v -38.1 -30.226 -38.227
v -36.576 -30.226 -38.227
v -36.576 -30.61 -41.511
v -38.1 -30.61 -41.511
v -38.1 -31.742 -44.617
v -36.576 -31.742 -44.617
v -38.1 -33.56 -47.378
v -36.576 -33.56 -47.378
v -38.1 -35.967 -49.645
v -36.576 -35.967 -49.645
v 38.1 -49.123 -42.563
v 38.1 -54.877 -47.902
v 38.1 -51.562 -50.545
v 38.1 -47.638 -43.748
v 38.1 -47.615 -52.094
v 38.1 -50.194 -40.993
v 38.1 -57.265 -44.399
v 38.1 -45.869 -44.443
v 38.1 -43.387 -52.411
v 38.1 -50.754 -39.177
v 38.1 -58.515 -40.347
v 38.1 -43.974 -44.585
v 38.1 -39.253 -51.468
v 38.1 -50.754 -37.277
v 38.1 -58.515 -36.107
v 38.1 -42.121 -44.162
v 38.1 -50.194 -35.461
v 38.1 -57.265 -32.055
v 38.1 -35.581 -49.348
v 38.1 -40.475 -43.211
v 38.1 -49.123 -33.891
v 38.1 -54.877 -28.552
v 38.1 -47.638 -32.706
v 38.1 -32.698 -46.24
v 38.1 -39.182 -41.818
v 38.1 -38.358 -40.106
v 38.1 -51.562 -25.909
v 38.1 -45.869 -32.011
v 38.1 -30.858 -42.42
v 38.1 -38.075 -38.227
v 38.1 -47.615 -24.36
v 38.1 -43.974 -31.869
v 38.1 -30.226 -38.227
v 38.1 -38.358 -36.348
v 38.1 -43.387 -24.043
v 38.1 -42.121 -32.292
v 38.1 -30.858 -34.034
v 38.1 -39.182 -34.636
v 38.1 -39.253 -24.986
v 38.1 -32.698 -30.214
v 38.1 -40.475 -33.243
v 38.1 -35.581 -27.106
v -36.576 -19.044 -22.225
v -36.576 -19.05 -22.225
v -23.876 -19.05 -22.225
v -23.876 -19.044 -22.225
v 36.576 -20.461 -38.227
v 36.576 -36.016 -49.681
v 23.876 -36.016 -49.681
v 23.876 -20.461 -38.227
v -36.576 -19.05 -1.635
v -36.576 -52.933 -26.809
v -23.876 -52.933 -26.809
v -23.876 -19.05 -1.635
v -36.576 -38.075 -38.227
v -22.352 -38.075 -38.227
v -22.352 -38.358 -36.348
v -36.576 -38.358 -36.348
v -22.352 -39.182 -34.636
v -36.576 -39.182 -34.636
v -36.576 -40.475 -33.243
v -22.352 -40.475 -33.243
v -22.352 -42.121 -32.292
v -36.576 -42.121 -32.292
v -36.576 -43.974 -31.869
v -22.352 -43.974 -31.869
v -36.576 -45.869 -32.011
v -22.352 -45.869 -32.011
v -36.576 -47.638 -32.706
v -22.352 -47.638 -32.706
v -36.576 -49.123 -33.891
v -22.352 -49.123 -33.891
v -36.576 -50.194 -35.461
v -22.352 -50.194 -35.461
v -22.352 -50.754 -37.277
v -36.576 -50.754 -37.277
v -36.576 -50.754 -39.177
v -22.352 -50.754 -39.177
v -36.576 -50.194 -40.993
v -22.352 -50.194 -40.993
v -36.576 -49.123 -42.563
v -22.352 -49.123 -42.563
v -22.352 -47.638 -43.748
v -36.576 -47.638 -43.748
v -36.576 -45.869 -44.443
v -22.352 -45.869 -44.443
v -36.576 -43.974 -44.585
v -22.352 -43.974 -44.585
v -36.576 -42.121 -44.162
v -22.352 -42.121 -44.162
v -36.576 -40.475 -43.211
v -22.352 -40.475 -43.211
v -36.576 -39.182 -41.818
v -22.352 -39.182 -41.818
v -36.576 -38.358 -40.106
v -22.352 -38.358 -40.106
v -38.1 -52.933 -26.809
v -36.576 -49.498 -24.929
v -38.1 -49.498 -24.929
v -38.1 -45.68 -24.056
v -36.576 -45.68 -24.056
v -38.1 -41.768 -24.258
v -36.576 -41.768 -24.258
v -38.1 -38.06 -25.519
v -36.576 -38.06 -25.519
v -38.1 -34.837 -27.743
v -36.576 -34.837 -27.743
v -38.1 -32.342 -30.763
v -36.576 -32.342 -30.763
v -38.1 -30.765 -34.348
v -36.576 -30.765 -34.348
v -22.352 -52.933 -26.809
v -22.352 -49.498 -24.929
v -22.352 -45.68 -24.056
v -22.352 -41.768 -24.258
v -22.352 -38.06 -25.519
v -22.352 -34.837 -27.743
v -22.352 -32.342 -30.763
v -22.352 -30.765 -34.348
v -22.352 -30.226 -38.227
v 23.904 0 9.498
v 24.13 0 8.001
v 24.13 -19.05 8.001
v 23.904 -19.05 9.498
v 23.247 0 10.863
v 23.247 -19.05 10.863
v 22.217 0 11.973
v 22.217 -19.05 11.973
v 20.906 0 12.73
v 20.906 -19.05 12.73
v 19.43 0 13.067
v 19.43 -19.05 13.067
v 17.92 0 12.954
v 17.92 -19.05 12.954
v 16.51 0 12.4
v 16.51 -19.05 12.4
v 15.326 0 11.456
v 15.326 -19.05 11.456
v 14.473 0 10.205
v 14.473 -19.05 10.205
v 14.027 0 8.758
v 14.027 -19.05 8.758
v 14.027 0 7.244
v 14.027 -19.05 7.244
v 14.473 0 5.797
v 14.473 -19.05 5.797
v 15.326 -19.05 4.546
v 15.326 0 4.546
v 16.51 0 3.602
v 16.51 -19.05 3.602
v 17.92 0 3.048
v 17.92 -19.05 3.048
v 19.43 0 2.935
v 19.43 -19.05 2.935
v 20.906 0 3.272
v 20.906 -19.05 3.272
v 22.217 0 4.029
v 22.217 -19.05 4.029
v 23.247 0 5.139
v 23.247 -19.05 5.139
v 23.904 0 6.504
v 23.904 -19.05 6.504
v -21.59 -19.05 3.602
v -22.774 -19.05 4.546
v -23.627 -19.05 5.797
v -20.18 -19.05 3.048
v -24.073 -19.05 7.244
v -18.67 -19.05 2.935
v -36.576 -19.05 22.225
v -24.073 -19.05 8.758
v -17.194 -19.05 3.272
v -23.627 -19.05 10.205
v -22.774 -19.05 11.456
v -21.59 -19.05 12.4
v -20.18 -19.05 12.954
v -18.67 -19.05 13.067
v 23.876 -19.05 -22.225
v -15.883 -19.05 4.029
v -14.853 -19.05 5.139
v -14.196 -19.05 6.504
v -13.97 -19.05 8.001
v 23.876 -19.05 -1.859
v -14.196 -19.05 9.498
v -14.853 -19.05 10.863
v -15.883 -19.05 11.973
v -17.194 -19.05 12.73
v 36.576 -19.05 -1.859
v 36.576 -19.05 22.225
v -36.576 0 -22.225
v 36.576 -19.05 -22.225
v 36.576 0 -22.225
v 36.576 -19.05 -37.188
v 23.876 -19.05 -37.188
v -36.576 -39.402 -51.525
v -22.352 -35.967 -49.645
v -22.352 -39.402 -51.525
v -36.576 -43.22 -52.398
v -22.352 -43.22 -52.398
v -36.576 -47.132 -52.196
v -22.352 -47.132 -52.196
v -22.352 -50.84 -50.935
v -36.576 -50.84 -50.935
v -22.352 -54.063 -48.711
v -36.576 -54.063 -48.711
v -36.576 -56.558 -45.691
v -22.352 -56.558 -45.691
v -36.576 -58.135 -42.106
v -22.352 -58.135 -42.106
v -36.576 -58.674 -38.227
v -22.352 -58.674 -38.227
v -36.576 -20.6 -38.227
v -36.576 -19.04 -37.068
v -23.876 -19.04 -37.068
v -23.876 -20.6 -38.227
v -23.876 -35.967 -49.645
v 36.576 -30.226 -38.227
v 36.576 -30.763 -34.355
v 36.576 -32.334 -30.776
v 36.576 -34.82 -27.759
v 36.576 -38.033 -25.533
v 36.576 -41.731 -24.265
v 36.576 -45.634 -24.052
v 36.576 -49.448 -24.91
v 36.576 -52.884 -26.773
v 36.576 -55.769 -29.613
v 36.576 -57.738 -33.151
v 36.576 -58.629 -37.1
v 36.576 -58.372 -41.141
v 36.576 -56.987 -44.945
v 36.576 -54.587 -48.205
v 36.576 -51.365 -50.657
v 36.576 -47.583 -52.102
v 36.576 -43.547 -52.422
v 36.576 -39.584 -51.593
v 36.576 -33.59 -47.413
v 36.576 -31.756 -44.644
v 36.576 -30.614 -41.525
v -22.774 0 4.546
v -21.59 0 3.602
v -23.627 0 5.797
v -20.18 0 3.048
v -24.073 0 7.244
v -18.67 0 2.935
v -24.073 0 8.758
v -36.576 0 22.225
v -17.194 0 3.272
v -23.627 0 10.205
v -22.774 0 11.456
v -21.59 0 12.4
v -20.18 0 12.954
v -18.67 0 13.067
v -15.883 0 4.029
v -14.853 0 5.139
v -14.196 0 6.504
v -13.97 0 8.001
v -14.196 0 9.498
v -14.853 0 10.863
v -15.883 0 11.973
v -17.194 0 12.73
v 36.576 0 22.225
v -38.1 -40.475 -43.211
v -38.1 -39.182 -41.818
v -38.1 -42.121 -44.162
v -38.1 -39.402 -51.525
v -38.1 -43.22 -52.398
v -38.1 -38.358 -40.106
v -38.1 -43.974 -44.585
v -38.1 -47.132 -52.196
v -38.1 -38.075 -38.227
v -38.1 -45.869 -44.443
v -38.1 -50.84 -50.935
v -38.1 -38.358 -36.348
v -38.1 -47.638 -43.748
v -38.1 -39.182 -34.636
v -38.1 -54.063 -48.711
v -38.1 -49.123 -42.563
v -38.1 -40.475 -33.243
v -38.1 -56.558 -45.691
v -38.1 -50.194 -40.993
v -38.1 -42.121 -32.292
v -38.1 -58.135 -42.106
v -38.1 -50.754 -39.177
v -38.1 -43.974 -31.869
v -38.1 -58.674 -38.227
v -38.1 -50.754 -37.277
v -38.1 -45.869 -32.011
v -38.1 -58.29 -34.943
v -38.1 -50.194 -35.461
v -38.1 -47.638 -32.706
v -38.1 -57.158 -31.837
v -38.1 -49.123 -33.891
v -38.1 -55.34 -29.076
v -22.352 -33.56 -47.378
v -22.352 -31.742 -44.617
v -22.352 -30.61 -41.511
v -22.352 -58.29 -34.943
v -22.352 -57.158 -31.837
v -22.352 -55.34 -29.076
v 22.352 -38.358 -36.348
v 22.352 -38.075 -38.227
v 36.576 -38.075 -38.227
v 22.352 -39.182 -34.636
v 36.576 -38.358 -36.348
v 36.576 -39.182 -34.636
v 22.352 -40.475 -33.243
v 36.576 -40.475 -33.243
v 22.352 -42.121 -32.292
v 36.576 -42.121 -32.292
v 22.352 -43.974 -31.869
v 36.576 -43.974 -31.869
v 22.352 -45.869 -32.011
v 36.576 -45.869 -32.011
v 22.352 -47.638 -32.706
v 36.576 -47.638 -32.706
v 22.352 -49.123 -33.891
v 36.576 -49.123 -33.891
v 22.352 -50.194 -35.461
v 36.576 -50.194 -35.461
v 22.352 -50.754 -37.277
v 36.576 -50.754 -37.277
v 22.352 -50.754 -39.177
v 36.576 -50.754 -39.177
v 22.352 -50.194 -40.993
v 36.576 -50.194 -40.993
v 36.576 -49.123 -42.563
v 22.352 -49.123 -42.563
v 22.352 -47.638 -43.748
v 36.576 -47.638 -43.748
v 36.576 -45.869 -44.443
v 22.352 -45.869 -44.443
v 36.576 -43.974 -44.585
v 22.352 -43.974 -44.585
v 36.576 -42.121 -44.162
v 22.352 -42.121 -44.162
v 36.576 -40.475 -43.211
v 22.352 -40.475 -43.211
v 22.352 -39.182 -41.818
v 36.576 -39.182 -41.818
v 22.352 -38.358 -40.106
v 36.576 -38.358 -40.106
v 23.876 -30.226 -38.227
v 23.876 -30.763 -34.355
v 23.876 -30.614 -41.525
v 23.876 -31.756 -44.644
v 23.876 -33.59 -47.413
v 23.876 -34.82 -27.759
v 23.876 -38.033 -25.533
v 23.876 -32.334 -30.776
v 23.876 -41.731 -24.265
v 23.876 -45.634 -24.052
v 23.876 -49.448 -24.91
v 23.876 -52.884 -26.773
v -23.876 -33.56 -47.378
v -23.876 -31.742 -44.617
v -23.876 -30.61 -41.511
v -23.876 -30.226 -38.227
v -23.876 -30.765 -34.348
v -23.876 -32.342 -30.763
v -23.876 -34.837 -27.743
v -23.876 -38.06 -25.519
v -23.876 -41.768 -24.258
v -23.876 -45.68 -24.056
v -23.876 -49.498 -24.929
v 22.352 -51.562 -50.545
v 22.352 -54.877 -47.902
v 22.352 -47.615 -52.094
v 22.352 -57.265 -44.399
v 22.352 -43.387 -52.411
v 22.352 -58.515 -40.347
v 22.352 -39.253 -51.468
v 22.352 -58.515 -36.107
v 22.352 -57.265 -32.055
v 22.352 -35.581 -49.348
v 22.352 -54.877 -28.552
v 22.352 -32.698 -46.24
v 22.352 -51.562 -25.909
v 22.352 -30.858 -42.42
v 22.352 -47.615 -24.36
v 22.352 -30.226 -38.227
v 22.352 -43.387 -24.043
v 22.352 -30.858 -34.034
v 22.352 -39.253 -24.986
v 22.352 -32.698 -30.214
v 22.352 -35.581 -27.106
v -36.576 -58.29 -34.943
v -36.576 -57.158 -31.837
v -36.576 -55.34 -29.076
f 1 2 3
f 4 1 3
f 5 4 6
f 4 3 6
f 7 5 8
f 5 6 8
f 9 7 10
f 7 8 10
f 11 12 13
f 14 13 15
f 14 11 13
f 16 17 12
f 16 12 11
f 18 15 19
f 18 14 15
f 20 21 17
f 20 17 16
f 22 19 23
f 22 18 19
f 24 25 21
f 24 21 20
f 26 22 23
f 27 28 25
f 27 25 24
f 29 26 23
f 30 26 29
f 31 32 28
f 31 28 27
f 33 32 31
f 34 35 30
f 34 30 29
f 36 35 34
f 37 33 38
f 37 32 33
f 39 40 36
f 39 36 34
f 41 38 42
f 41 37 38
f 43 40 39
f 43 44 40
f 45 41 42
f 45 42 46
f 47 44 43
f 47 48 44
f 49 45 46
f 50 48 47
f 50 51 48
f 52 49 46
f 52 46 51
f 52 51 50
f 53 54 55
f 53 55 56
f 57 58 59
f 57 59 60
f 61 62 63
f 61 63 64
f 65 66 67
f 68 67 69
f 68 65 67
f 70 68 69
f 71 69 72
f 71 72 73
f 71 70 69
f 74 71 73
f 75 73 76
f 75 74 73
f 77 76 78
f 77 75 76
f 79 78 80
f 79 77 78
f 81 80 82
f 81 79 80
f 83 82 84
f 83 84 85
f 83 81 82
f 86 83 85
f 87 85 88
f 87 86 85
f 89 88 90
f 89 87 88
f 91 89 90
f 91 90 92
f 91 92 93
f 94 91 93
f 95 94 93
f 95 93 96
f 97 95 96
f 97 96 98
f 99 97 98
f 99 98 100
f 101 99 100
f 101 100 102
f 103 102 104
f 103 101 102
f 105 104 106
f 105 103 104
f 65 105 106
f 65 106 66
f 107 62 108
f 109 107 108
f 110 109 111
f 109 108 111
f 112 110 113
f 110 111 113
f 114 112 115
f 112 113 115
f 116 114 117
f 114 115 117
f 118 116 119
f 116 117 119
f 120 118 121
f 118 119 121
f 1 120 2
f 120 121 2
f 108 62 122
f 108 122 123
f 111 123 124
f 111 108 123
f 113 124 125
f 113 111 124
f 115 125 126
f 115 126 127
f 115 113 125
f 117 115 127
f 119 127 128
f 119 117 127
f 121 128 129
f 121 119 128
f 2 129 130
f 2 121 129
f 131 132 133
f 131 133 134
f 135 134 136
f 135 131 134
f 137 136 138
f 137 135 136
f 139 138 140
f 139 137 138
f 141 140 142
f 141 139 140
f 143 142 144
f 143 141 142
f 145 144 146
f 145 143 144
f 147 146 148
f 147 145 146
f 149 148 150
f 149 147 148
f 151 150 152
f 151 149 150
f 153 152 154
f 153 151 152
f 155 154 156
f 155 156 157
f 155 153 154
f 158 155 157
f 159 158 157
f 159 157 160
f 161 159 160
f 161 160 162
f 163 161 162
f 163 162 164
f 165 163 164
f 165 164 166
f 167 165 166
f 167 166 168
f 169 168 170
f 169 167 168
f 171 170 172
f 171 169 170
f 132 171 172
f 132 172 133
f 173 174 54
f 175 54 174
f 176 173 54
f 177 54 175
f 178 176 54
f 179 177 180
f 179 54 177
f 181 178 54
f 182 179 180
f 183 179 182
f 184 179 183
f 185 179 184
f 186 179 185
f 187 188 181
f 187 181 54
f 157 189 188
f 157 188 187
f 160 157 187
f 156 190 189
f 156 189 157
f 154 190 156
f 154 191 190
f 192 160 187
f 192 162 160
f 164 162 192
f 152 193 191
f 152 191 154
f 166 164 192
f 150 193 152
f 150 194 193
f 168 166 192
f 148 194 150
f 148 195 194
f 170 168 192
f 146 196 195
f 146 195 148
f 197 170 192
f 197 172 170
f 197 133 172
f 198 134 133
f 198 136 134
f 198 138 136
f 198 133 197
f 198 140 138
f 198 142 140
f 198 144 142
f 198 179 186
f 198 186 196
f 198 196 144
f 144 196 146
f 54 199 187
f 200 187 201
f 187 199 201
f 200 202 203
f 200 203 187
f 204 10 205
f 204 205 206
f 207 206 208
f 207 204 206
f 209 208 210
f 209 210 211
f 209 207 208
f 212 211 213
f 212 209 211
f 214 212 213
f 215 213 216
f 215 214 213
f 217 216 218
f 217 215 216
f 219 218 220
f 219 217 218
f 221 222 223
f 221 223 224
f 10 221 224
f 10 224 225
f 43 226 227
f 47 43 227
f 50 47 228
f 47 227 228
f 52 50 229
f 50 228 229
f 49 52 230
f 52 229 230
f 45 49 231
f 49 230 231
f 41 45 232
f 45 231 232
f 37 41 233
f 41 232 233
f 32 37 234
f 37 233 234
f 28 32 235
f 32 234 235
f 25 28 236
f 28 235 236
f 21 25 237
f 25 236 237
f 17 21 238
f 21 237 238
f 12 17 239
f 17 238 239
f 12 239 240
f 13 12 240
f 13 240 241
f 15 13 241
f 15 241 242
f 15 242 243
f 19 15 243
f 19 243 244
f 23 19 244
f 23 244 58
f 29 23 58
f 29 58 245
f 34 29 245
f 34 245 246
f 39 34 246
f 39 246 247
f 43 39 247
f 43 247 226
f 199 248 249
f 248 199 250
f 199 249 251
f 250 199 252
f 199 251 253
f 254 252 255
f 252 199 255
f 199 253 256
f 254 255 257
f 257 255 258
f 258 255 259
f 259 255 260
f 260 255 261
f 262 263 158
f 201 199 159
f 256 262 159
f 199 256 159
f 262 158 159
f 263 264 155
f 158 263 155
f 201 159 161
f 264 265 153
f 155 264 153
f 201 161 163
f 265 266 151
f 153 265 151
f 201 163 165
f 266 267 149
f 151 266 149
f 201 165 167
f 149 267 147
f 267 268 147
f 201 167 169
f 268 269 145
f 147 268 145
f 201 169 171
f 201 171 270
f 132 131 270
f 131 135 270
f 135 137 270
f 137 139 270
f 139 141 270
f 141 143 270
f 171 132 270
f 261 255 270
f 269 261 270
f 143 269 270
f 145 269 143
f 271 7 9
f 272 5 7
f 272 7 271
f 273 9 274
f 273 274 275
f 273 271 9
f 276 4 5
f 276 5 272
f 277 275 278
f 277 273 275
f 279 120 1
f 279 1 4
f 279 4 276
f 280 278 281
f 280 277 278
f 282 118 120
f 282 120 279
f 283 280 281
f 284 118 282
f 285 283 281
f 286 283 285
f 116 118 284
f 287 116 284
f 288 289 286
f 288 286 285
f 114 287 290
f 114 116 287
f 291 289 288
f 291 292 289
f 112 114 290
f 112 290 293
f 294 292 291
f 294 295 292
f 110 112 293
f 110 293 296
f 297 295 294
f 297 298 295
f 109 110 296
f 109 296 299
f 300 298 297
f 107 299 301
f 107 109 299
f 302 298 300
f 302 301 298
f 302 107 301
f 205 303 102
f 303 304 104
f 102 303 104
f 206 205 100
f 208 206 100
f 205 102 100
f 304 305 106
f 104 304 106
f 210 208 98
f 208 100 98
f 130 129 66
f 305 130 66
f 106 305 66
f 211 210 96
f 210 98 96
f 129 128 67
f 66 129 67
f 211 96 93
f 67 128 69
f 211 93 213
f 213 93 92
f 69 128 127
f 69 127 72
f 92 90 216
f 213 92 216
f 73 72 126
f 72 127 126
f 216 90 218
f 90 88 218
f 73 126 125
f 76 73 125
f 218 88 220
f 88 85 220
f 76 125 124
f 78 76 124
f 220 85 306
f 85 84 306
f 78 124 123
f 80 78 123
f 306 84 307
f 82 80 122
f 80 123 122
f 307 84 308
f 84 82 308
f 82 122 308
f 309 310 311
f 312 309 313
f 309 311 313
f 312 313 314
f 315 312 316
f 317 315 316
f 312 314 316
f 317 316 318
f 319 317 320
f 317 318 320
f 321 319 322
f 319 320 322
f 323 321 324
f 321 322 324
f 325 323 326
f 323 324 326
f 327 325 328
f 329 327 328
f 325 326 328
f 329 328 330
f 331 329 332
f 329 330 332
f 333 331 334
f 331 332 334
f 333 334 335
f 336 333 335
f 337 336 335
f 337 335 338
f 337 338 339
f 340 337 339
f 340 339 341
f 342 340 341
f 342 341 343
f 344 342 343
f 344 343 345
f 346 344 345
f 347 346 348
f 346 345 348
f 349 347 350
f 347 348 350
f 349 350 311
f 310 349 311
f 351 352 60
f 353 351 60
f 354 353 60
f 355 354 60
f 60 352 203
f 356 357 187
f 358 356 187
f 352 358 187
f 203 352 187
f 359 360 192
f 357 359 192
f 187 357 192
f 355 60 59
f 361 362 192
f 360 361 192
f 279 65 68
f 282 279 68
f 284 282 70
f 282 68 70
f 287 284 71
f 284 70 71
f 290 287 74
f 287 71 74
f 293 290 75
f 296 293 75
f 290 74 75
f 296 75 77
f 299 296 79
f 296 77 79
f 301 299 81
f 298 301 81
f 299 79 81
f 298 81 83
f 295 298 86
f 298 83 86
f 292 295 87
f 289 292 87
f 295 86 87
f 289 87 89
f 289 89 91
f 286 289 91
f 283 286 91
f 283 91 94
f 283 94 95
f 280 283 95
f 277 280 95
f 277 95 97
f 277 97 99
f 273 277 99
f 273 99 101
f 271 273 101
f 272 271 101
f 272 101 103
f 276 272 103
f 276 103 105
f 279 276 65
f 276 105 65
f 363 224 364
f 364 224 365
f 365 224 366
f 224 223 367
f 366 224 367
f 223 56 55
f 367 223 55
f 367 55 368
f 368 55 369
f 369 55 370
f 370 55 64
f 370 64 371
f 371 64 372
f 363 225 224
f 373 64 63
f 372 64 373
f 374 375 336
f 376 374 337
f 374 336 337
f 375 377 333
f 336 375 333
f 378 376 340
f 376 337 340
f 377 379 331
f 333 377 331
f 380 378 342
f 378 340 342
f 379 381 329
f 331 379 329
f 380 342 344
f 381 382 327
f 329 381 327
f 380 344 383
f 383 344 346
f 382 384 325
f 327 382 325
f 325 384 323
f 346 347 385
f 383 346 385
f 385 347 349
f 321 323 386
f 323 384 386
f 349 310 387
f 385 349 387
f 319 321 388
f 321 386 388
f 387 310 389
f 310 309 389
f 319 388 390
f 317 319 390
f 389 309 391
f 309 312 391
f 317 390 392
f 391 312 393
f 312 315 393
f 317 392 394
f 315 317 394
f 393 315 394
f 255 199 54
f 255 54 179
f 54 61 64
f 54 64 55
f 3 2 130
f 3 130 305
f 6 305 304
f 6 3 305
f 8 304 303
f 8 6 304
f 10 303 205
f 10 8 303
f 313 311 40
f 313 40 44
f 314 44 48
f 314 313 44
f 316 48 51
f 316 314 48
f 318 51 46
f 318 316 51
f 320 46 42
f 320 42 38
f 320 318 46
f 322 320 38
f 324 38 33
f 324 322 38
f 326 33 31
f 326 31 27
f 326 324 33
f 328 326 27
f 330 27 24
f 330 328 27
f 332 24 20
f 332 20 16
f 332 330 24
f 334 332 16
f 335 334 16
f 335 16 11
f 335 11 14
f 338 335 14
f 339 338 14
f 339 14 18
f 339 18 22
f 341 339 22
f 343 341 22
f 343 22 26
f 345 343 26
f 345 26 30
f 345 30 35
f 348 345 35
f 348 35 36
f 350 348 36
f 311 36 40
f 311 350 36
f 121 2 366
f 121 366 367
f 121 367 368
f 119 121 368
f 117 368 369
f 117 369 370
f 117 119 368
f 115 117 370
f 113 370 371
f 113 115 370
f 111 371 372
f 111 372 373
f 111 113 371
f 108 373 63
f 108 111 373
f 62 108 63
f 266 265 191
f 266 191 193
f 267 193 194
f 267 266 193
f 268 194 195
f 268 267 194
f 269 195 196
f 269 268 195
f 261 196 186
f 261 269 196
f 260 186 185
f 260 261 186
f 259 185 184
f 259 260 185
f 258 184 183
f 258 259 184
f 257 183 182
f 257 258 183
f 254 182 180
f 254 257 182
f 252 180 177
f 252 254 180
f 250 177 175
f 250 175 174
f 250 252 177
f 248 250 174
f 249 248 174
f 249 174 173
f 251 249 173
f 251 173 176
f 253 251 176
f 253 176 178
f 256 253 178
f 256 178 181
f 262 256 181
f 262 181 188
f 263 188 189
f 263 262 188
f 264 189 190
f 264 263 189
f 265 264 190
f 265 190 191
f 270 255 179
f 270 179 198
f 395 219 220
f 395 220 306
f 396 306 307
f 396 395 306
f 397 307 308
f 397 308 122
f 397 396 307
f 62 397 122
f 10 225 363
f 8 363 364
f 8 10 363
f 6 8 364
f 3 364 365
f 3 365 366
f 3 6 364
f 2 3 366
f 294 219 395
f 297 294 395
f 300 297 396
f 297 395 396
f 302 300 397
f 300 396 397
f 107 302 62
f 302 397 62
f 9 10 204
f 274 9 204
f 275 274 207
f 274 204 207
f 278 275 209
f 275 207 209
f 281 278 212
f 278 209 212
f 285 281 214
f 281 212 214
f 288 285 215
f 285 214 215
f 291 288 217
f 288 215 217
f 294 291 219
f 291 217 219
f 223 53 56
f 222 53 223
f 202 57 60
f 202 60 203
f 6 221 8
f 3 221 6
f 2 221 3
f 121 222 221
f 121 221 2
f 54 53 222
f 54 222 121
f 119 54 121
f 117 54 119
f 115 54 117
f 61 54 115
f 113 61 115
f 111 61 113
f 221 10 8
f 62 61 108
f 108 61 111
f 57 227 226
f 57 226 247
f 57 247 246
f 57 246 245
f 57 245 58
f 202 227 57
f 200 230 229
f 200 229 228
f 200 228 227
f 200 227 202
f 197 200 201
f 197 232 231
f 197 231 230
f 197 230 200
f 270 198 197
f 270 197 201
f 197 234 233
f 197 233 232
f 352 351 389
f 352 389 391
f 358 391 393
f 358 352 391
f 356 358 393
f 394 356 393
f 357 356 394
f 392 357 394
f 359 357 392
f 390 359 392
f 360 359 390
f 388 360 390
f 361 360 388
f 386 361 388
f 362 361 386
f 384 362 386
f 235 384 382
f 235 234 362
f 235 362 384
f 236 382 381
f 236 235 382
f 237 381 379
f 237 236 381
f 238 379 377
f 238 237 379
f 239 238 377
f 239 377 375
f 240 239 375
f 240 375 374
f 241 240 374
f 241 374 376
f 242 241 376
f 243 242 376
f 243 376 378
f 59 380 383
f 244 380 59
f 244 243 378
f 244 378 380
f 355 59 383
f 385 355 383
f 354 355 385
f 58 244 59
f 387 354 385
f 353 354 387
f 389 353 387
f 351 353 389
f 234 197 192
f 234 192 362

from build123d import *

# Parameters (mm, degrees)
F0_W          = 73.152
F0_H          = 44.45
F0_R          = 5.08
F1_DEPTH      = 19.05
F3_DEPTH      = 12.7
F2_R          = 6.3754
F4_DEPTH      = 1.524
F4_DEPTH_BACK = 14.224
F6_DEPTH      = 12.7
F7_DEPTH      = 1.524
F7_DEPTH_BACK = 14.224


with BuildPart() as f1:
    # F0 (on Front) → F1 (new body)
    with BuildSketch(Plane.XZ):
        Rectangle(F0_W, F0_H)
        with Locations((-19.05, 8.001)):
            Circle(F0_R, mode=Mode.SUBTRACT)
        with Locations((19.05, 8.001)):
            Circle(F0_R, mode=Mode.SUBTRACT)
    extrude(amount=F1_DEPTH)

    # F2 (on face) → F3 (join)
    with BuildSketch(Plane.YZ.offset(36.576)):
        with BuildLine():
            Line((-36.0159397474, -49.6807680986), (-20.4612958716, -38.227))
            Line((-20.4612958716, -38.227), (-30.226, -38.227))
            ThreePointArc((-30.226, -38.227), (-31.7557444284, -44.6440126604), (-36.0159397474, -49.6807680986))
        make_face()
        with BuildLine():
            Line((-19.05, -22.225), (-19.05, -1.8592908906))
            Line((-19.05, -1.8592908906), (-52.8840602526, -26.7732319014))
            ThreePointArc((-52.8840602526, -26.7732319014), (-38.0329873396, -25.5327444284), (-30.226, -38.227))
            Line((-30.226, -38.227), (-20.4612958716, -38.227))
            Line((-20.4612958716, -38.227), (-19.05, -37.187841339))
            Line((-19.05, -37.187841339), (-19.05, -22.225))
        make_face()
    extrude(amount=-F3_DEPTH)

    # F2 (on face) → F4 (join, two sides)
    with BuildSketch(Plane.YZ.offset(36.576)) as f4_sk:
        with BuildLine():
            ThreePointArc((-30.226, -38.227), (-38.0329873396, -25.5327444284), (-52.8840602526, -26.7732319014))
            ThreePointArc((-52.8840602526, -26.7732319014), (-55.9037680986, -46.6610602526), (-36.0159397474, -49.6807680986))
            ThreePointArc((-36.0159397474, -49.6807680986), (-31.7557444284, -44.6440126604), (-30.226, -38.227))
        make_face()
        with Locations((-44.45, -38.227)):
            Circle(F2_R, mode=Mode.SUBTRACT)
    extrude(amount=F4_DEPTH)
    extrude(f4_sk.sketch, amount=-F4_DEPTH_BACK)


with BuildPart() as f6:
    # F5 (on face) → F6 (new body)
    with BuildSketch(Plane(origin=(-36.576, 0, 0), x_dir=(0, -1, 0), z_dir=(-1, 0, 0))):
        with BuildLine():
            Line((30.226, -38.227), (20.5998611319, -38.227))
            Line((20.5998611319, -38.227), (35.9669392883, -49.644524117))
            ThreePointArc((35.9669392883, -49.644524117), (31.7420255044, -44.616801266), (30.226, -38.227))
        make_face()
        with BuildLine():
            Line((52.9330607117, -26.809475883), (19.05, -1.6348357272))
            Line((19.05, -1.6348357272), (19.05, -22.225))
            Line((19.05, -22.225), (19.0440241449, -22.225))
            Line((19.0440241449, -22.225), (19.0397163295, -37.0678342349))
            Line((19.0397163295, -37.0678342349), (20.5998611319, -38.227))
            Line((20.5998611319, -38.227), (30.226, -38.227))
            ThreePointArc((30.226, -38.227), (38.060198734, -25.5190255044), (52.9330607117, -26.809475883))
        make_face()
    extrude(amount=-F6_DEPTH)


with BuildPart() as f7:
    # F5 (on face) → F7 (new body, two sides)
    with BuildSketch(Plane(origin=(-36.576, 0, 0), x_dir=(0, -1, 0), z_dir=(-1, 0, 0))) as f7_sk:
        with BuildLine():
            ThreePointArc((58.674, -38.227), (57.1579744956, -31.837198734), (52.9330607117, -26.809475883))
            ThreePointArc((52.9330607117, -26.809475883), (38.060198734, -25.5190255044), (30.226, -38.227))
            ThreePointArc((30.226, -38.227), (31.7420255044, -44.616801266), (35.9669392883, -49.644524117))
            ThreePointArc((35.9669392883, -49.644524117), (50.839801266, -50.9349744956), (58.674, -38.227))
        make_face()
        with BuildLine():
            ThreePointArc((50.8254, -38.227), (44.45, -44.6024), (38.0746, -38.227))
            ThreePointArc((38.0746, -38.227), (44.45, -31.8516), (50.8254, -38.227))
        make_face(mode=Mode.SUBTRACT)
    extrude(amount=F7_DEPTH)
    extrude(f7_sk.sketch, amount=-F7_DEPTH_BACK)


solid = Compound([f1.part, f6.part, f7.part])
